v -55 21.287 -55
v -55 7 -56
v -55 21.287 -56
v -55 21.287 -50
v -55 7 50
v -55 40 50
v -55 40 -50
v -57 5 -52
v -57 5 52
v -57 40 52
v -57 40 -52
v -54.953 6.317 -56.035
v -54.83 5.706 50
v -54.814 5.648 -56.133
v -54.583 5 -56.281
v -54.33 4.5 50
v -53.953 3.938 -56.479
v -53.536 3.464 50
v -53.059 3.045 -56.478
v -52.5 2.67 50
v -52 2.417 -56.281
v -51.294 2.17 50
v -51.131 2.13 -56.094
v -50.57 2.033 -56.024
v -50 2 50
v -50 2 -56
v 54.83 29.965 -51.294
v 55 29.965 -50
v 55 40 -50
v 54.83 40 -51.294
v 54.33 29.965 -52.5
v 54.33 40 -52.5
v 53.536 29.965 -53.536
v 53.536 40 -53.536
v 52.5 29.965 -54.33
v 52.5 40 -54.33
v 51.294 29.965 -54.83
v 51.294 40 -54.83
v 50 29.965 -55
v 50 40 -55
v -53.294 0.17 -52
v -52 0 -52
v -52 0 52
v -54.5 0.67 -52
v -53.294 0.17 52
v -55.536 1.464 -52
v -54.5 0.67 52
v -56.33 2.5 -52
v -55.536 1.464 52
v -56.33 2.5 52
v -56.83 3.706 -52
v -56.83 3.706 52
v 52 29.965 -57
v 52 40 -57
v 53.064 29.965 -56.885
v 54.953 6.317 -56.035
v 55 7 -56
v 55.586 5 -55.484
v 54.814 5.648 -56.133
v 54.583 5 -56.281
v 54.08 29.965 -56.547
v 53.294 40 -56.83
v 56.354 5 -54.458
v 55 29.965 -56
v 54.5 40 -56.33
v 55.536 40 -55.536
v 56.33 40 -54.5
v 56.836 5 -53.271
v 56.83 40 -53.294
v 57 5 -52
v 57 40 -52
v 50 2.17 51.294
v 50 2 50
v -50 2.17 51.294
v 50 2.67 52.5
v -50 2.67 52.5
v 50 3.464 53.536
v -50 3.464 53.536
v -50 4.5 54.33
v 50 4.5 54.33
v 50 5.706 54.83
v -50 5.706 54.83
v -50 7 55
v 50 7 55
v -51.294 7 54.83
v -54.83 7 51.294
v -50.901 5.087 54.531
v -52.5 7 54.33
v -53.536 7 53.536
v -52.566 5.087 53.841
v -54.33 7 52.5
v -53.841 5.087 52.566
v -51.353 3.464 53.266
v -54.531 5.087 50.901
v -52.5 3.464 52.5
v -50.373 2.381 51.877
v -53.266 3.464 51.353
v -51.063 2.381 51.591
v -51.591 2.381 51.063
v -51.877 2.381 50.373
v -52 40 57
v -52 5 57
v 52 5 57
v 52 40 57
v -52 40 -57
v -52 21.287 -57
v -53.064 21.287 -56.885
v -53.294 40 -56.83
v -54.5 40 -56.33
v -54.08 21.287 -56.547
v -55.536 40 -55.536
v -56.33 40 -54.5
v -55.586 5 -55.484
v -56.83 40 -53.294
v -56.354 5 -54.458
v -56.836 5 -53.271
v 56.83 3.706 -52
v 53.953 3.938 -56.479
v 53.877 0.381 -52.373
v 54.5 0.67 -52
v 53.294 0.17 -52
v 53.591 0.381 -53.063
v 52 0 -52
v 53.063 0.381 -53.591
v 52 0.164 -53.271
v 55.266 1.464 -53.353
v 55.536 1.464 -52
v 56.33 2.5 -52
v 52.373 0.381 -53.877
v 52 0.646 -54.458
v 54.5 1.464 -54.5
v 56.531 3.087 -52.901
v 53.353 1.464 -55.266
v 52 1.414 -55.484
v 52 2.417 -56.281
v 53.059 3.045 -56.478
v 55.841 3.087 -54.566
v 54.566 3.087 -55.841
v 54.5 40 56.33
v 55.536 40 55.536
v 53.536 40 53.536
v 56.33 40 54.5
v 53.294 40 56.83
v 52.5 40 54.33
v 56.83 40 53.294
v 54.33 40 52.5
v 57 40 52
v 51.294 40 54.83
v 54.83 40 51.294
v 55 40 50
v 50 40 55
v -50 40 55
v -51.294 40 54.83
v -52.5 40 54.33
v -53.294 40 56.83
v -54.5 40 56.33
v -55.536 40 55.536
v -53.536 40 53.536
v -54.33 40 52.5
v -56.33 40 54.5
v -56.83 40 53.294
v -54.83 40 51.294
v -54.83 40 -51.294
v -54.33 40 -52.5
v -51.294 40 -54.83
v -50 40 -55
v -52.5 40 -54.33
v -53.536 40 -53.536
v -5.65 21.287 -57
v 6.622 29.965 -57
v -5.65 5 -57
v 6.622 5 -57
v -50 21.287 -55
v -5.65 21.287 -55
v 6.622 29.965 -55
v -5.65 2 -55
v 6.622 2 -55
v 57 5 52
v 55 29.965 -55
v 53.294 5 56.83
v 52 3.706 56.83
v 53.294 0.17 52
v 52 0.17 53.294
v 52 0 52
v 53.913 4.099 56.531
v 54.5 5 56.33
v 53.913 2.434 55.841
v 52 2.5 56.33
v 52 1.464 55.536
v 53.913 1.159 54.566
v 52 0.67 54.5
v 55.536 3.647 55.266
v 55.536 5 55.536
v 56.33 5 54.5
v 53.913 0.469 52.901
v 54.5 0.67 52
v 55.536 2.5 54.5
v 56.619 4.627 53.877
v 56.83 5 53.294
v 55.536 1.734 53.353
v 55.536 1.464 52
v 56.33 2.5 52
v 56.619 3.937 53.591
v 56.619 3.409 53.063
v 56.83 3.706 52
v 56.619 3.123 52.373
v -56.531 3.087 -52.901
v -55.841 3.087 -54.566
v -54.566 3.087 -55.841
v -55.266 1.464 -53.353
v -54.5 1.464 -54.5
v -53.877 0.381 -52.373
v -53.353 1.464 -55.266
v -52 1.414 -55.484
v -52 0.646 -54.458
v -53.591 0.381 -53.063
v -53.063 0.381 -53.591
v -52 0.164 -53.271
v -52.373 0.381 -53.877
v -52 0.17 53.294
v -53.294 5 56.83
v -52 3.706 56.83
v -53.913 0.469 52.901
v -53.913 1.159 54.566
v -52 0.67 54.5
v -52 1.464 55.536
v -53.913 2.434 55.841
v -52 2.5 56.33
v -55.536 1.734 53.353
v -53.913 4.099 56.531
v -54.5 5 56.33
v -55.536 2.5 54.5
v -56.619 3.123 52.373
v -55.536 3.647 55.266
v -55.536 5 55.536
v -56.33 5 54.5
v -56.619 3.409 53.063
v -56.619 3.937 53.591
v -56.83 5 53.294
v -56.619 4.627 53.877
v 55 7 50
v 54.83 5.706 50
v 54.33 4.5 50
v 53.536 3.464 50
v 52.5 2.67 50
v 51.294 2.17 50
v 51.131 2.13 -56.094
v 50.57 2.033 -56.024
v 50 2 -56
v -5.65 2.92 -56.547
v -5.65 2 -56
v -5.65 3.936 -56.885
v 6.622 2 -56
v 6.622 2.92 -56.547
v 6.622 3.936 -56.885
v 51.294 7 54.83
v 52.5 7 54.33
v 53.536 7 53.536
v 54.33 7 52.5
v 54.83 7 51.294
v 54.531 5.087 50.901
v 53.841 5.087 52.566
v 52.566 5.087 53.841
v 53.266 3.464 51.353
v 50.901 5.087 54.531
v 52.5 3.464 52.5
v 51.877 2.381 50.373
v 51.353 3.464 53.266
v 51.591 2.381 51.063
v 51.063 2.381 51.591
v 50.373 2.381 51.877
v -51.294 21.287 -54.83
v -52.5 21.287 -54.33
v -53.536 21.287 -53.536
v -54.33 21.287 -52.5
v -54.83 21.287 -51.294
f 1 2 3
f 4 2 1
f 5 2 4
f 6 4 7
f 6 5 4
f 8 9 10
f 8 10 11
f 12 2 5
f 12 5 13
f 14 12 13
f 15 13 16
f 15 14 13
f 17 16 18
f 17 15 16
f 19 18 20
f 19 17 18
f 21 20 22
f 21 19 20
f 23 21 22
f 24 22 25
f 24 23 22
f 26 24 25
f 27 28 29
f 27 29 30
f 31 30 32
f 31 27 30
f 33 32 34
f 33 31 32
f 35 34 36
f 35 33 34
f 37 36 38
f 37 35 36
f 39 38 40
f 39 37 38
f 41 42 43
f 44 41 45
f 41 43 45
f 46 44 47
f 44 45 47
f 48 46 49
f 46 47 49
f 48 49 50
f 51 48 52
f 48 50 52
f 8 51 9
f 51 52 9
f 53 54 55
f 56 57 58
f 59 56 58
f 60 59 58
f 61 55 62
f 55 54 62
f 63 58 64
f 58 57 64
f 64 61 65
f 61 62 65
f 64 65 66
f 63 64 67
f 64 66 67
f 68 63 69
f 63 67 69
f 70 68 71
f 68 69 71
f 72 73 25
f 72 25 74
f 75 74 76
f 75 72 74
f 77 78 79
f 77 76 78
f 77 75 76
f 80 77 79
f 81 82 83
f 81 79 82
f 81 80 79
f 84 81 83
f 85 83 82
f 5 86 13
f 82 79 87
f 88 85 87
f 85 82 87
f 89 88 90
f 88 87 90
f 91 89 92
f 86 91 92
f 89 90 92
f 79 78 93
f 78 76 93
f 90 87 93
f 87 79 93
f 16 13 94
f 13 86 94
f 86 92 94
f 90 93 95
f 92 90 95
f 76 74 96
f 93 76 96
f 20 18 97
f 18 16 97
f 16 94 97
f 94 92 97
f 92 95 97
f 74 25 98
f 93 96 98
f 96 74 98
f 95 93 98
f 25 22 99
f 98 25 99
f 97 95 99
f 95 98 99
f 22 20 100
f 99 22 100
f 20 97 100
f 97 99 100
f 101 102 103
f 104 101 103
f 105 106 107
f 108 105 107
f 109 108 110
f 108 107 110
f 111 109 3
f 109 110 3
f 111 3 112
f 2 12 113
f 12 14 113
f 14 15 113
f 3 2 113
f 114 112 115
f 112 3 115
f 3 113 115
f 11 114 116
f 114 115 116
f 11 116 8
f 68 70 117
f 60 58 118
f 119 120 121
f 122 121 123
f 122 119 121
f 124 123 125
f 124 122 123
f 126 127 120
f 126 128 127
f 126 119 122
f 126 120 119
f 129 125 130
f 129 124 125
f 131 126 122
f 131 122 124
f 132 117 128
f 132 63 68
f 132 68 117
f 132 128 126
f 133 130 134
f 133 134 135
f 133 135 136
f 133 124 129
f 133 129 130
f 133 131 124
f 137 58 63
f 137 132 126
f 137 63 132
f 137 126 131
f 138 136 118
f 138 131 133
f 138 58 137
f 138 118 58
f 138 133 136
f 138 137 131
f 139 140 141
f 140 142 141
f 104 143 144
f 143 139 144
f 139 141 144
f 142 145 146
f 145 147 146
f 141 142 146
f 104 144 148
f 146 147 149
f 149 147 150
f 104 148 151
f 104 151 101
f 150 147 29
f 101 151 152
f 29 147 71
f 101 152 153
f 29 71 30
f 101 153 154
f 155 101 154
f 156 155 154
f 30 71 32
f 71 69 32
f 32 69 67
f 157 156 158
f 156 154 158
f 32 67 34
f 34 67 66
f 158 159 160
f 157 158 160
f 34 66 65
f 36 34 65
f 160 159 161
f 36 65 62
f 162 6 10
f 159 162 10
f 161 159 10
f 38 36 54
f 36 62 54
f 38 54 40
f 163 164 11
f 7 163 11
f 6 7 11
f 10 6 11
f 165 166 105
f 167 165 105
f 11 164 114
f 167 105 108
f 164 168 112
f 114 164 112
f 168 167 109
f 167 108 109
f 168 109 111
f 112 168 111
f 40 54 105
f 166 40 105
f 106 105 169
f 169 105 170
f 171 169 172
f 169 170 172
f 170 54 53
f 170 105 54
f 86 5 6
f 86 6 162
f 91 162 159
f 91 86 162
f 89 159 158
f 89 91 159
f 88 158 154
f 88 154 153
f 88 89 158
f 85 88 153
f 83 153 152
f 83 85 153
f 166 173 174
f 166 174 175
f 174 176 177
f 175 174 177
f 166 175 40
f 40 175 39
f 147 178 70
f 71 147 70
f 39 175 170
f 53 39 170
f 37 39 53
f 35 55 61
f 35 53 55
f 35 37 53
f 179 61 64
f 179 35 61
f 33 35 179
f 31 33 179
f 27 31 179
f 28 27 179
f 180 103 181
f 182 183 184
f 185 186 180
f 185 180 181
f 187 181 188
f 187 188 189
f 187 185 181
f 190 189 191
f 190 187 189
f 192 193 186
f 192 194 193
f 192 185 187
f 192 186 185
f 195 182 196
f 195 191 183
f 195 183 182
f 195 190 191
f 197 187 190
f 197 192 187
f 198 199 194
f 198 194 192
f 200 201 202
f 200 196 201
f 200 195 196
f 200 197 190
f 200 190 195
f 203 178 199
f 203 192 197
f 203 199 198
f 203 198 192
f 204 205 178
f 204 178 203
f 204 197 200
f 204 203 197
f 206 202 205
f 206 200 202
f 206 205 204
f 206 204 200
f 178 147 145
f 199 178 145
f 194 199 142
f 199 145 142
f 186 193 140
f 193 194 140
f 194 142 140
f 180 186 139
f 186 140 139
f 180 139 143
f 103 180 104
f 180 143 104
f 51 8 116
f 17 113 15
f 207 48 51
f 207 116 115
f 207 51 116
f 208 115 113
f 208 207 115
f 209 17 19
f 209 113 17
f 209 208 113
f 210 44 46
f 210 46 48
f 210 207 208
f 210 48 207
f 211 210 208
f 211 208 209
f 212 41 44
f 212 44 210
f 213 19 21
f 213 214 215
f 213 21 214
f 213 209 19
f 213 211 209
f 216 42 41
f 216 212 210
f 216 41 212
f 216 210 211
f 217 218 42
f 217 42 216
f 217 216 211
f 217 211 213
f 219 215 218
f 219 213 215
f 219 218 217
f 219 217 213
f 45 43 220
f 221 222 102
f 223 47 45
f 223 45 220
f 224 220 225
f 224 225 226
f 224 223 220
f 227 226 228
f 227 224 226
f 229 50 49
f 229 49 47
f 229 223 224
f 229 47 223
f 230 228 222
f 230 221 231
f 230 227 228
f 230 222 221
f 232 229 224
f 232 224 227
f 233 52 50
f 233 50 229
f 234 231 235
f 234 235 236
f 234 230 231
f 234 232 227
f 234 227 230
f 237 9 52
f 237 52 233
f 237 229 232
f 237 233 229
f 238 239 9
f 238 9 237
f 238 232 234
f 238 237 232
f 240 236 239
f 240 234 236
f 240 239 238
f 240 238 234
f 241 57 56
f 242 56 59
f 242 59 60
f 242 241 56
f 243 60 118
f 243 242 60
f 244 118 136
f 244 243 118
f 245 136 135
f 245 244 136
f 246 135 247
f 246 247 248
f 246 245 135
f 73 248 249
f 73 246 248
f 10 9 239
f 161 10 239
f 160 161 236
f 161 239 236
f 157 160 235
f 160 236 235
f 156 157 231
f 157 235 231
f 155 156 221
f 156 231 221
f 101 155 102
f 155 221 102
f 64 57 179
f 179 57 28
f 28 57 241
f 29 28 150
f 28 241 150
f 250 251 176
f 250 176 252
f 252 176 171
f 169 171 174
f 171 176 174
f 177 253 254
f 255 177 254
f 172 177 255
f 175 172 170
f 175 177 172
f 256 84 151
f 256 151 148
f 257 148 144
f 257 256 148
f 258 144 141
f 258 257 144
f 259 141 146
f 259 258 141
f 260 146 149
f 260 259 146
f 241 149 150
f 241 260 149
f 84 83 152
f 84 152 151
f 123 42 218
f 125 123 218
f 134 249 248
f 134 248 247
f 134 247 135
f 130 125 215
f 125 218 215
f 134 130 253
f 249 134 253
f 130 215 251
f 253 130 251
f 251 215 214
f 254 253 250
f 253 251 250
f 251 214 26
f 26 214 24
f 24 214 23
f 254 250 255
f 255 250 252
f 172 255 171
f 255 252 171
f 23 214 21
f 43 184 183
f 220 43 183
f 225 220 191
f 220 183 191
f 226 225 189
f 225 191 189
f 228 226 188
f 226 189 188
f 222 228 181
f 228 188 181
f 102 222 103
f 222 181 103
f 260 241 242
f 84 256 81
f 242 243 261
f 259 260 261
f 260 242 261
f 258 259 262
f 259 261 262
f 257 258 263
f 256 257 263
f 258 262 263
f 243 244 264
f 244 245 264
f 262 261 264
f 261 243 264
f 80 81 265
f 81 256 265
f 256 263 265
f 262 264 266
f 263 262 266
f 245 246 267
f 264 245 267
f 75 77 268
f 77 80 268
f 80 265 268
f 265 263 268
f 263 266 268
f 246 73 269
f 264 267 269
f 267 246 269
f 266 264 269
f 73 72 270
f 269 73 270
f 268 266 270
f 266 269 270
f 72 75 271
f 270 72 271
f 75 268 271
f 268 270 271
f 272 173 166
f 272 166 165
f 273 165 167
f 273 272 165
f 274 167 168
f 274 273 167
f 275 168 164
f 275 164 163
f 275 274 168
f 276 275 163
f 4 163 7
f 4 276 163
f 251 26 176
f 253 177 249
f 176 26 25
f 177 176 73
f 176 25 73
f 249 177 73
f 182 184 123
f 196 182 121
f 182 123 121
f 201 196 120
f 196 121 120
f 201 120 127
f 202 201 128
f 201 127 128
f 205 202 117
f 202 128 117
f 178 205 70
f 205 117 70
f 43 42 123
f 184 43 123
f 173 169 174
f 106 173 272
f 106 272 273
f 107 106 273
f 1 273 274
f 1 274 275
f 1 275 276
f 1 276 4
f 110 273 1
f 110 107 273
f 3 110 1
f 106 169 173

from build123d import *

# Parameters (mm, degrees)
SKETCH1_W           = 114
SKETCH1_H           = 114
SKETCH1_W_2         = 110
SKETCH1_H_2         = 110
BOSS_EXTRUDE1_DEPTH = 2
SKETCH1_3_W         = 114
SKETCH1_3_H         = 114
SKETCH1_3_W_2       = 110
SKETCH1_3_H_2       = 110
BOSS_EXTRUDE2_DEPTH = 40
SKETCH2_W           = 48.37766652
SKETCH2_H           = 27.964547649
SKETCH2_W_2         = 49.350090125
SKETCH2_H_2         = 19.287013153
CUT_EXTRUDE1_DEPTH  = 132.882523482
FILLET1_R           = 5
FILLET2_R           = 5


with BuildPart() as part:
    # Sketch1 → Boss-Extrude1 (new body)
    # profile 1 of 2: a face of its own
    with BuildSketch(Plane(origin=(0, 0, 0), x_dir=(1, 0, 0), z_dir=(0, 1, 0))):
        Rectangle(SKETCH1_W, SKETCH1_H)
        Rectangle(SKETCH1_W_2, SKETCH1_H_2, mode=Mode.SUBTRACT)
    # profile 2 of 2: a face of its own
    with BuildSketch(Plane(origin=(0, 0, 0), x_dir=(1, 0, 0), z_dir=(0, 1, 0))):
        Rectangle(SKETCH1_W_2, SKETCH1_H_2)
    extrude(amount=BOSS_EXTRUDE1_DEPTH)

    # Sketch1<3> → Boss-Extrude2 (add)
    with BuildSketch(Plane(origin=(0, 0, 0), x_dir=(1, 0, 0), z_dir=(0, 1, 0))):
        Rectangle(SKETCH1_3_W, SKETCH1_3_H)
        Rectangle(SKETCH1_3_W_2, SKETCH1_3_H_2, mode=Mode.SUBTRACT)
    extrude(amount=BOSS_EXTRUDE2_DEPTH)

    # Sketch2 → Cut-Extrude1 (cut, through all)
    with BuildSketch(Plane.XY.offset(-55)):
        with Locations((30.81116674, 15.982273825)):
            Rectangle(SKETCH2_W, SKETCH2_H)
        with Locations((-30.324954937, 11.643506577)):
            Rectangle(SKETCH2_W_2, SKETCH2_H_2)
    extrude(amount=-CUT_EXTRUDE1_DEPTH, mode=Mode.SUBTRACT)

    # Fillet1
    # the kernel refuses this fillet: 5 mm, written as the material it adds along each edge
    with BuildSketch(Plane(origin=(50, 7, 50), x_dir=(0, 0, 1), z_dir=(0, -1, 0))) as fillet1_piece_1_section:
        Polygon((0, 0), (FILLET1_R, 0), (FILLET1_R, -FILLET1_R), (0, -FILLET1_R), align=None)
    fillet1_piece_1 = extrude(amount=FILLET1_R, mode=Mode.PRIVATE)
    fillet1_piece_1 = fillet1_piece_1 - Plane(origin=(50, 7, 50), x_dir=(-0.7071067811865477, 0, -0.7071067811865475), z_dir=(0, -1, 0)) * Sphere(FILLET1_R, mode=Mode.PRIVATE)
    add(fillet1_piece_1)
    with BuildSketch(Plane(origin=(-50, 7, 50), x_dir=(-1, 0, 0), z_dir=(0, -1, 0))) as fillet1_piece_2_section:
        Polygon((0, 0), (FILLET1_R, 0), (FILLET1_R, -FILLET1_R), (0, -FILLET1_R), align=None)
    fillet1_piece_2 = extrude(amount=FILLET1_R, mode=Mode.PRIVATE)
    fillet1_piece_2 = fillet1_piece_2 - Plane(origin=(-50, 7, 50), x_dir=(0.7071067811865475, 0, -0.7071067811865476), z_dir=(0, -1, 0)) * Sphere(FILLET1_R, mode=Mode.PRIVATE)
    add(fillet1_piece_2)
    with BuildSketch(Plane(origin=(55, 2, 50), x_dir=(0, 1, 0), z_dir=(0, 0, -1)), Plane(origin=(-55, 2, -57), x_dir=(0, 1, 0), z_dir=(0, 0, 1))) as fillet1_piece_3:
        with BuildLine():
            CenterArc((FILLET1_R, -FILLET1_R), FILLET1_R, 90, 90)
            Line((0, -FILLET1_R), (0, 0))
            Line((0, 0), (FILLET1_R, 0))
        make_face()
    extrude(amount=107)
    with BuildSketch(Plane(origin=(50, 2, 55), x_dir=(0, 1, 0), z_dir=(-1, 0, 0))) as fillet1_piece_4:
        with BuildLine():
            CenterArc((FILLET1_R, FILLET1_R), FILLET1_R, 180, 90)
            Line((0, FILLET1_R), (0, 0))
            Line((0, 0), (FILLET1_R, 0))
        make_face()
    extrude(amount=100)
    with BuildSketch(Plane(origin=(-55, 7, 55), x_dir=(0, 0, -1), z_dir=(0, 1, 0)), Plane(origin=(55, 7, 55), x_dir=(-1, 0, 0), z_dir=(0, 1, 0))) as fillet1_piece_5:
        with BuildLine():
            CenterArc((FILLET1_R, -FILLET1_R), FILLET1_R, 90, 90)
            Line((0, -FILLET1_R), (0, 0))
            Line((0, 0), (FILLET1_R, 0))
        make_face()
    extrude(amount=33)
    with BuildSketch(Plane(origin=(55, 29.964547649, -55), x_dir=(-1, 0, 0), z_dir=(0, 1, 0))) as fillet1_piece_6:
        with BuildLine():
            CenterArc((FILLET1_R, FILLET1_R), FILLET1_R, 180, 90)
            Line((0, FILLET1_R), (0, 0))
            Line((0, 0), (FILLET1_R, 0))
        make_face()
    extrude(amount=10.035452351)
    with BuildSketch(Plane(origin=(-55, 21.287013153, -55), x_dir=(1, 0, 0), z_dir=(0, 1, 0))) as fillet1_piece_7:
        with BuildLine():
            CenterArc((FILLET1_R, -FILLET1_R), FILLET1_R, 90, 90)
            Line((0, -FILLET1_R), (0, 0))
            Line((0, 0), (FILLET1_R, 0))
        make_face()
    extrude(amount=18.712986847)
    # the kernel refuses this fillet: 5 mm, written as the material it takes off along each edge
    with BuildSketch(Plane(origin=(69.5, 0, 57), x_dir=(0, 0, -1), z_dir=(-1, 0, 0))) as fillet1_2_piece_1:
        with BuildLine():
            CenterArc((FILLET1_R, -FILLET1_R), FILLET1_R, 90, 90)
            Line((0, -FILLET1_R), (0, 0))
            Line((0, 0), (FILLET1_R, 0))
        make_face()
    extrude(amount=139, mode=Mode.SUBTRACT)
    with BuildSketch(Plane(origin=(-57, -12.5, 57), x_dir=(1, 0, 0), z_dir=(0, 1, 0)), Plane(origin=(57, 52.5, 57), x_dir=(-1, 0, 0), z_dir=(0, -1, 0))) as fillet1_2_piece_2:
        with BuildLine():
            CenterArc((FILLET1_R, FILLET1_R), FILLET1_R, 180, 90)
            Line((0, FILLET1_R), (0, 0))
            Line((0, 0), (FILLET1_R, 0))
        make_face()
    extrude(amount=65, mode=Mode.SUBTRACT)
    with BuildSketch(Plane(origin=(57, 52.5, -57), x_dir=(-1, 0, 0), z_dir=(0, -1, 0)), Plane(origin=(-57, -12.5, -57), x_dir=(1, 0, 0), z_dir=(0, 1, 0))) as fillet1_2_piece_3:
        with BuildLine():
            CenterArc((FILLET1_R, -FILLET1_R), FILLET1_R, 90, 90)
            Line((0, -FILLET1_R), (0, 0))
            Line((0, 0), (FILLET1_R, 0))
        make_face()
    extrude(amount=65, mode=Mode.SUBTRACT)

    # Fillet2
    # the kernel refuses this fillet: 5 mm, written as the material it takes off along each edge
    with BuildSketch(Plane(origin=(52, 5, 52), x_dir=(0, -1, 0), z_dir=(1, 0, 0))) as fillet2_piece_1_section:
        Polygon((0, 0), (FILLET2_R, 0), (FILLET2_R, -FILLET2_R), (0, -FILLET2_R), align=None)
    fillet2_piece_1 = extrude(amount=FILLET2_R, mode=Mode.PRIVATE)
    fillet2_piece_1 = fillet2_piece_1 - Plane(origin=(52, 5, 52), x_dir=(0, 0.7071067811865475, -0.7071067811865475), z_dir=(1, 0, 0)) * Sphere(FILLET2_R, mode=Mode.PRIVATE)
    add(fillet2_piece_1, mode=Mode.SUBTRACT)
    with BuildSketch(Plane(origin=(-52, 5, 52), x_dir=(0, -1, 0), z_dir=(-1, 0, 0))) as fillet2_piece_2_section:
        Polygon((0, 0), (FILLET2_R, 0), (FILLET2_R, FILLET2_R), (0, FILLET2_R), align=None)
    fillet2_piece_2 = extrude(amount=FILLET2_R, mode=Mode.PRIVATE)
    fillet2_piece_2 = fillet2_piece_2 - Plane(origin=(-52, 5, 52), x_dir=(0, 0.7071067811865475, -0.7071067811865475), z_dir=(-1, 0, 0)) * Sphere(FILLET2_R, mode=Mode.PRIVATE)
    add(fillet2_piece_2, mode=Mode.SUBTRACT)
    with BuildSketch(Plane(origin=(57, 0, -52), x_dir=(0, 1, 0), z_dir=(0, 0, 1)), Plane(origin=(-52, 0, -57), x_dir=(0, 1, 0), z_dir=(1, 0, 0)), Plane(origin=(-57, 0, 52), x_dir=(0, 1, 0), z_dir=(0, 0, -1))) as fillet2_piece_3:
        with BuildLine():
            CenterArc((FILLET2_R, FILLET2_R), FILLET2_R, 180, 90)
            Line((0, FILLET2_R), (0, 0))
            Line((0, 0), (FILLET2_R, 0))
        make_face()
    extrude(amount=104, mode=Mode.SUBTRACT)
    with BuildSketch(Plane(origin=(52, 0, -52), x_dir=(1, 0, 0), z_dir=(0, 0, 1))) as fillet2_piece_4:
        with BuildLine():
            CenterArc((5 - FILLET2_R, FILLET2_R), FILLET2_R, 270, 90)
            Line((5 - FILLET2_R, 0), (5, 0))
            Line((5, 0), (5, FILLET2_R))
        make_face()
    revolve(axis=Axis((52, 0, -52), (0, 1, 0)), revolution_arc=90, mode=Mode.SUBTRACT)
    with BuildSketch(Plane(origin=(-52, 0, -52), x_dir=(-1, 0, 0), z_dir=(0, 0, 1))) as fillet2_piece_5:
        with BuildLine():
            CenterArc((5 - FILLET2_R, -FILLET2_R), FILLET2_R, 0, 90)
            Line((5 - FILLET2_R, 0), (5, 0))
            Line((5, 0), (5, -FILLET2_R))
        make_face()
    revolve(axis=Axis((-52, 0, -52), (0, -1, 0)), revolution_arc=90, mode=Mode.SUBTRACT)


solid = part.part
